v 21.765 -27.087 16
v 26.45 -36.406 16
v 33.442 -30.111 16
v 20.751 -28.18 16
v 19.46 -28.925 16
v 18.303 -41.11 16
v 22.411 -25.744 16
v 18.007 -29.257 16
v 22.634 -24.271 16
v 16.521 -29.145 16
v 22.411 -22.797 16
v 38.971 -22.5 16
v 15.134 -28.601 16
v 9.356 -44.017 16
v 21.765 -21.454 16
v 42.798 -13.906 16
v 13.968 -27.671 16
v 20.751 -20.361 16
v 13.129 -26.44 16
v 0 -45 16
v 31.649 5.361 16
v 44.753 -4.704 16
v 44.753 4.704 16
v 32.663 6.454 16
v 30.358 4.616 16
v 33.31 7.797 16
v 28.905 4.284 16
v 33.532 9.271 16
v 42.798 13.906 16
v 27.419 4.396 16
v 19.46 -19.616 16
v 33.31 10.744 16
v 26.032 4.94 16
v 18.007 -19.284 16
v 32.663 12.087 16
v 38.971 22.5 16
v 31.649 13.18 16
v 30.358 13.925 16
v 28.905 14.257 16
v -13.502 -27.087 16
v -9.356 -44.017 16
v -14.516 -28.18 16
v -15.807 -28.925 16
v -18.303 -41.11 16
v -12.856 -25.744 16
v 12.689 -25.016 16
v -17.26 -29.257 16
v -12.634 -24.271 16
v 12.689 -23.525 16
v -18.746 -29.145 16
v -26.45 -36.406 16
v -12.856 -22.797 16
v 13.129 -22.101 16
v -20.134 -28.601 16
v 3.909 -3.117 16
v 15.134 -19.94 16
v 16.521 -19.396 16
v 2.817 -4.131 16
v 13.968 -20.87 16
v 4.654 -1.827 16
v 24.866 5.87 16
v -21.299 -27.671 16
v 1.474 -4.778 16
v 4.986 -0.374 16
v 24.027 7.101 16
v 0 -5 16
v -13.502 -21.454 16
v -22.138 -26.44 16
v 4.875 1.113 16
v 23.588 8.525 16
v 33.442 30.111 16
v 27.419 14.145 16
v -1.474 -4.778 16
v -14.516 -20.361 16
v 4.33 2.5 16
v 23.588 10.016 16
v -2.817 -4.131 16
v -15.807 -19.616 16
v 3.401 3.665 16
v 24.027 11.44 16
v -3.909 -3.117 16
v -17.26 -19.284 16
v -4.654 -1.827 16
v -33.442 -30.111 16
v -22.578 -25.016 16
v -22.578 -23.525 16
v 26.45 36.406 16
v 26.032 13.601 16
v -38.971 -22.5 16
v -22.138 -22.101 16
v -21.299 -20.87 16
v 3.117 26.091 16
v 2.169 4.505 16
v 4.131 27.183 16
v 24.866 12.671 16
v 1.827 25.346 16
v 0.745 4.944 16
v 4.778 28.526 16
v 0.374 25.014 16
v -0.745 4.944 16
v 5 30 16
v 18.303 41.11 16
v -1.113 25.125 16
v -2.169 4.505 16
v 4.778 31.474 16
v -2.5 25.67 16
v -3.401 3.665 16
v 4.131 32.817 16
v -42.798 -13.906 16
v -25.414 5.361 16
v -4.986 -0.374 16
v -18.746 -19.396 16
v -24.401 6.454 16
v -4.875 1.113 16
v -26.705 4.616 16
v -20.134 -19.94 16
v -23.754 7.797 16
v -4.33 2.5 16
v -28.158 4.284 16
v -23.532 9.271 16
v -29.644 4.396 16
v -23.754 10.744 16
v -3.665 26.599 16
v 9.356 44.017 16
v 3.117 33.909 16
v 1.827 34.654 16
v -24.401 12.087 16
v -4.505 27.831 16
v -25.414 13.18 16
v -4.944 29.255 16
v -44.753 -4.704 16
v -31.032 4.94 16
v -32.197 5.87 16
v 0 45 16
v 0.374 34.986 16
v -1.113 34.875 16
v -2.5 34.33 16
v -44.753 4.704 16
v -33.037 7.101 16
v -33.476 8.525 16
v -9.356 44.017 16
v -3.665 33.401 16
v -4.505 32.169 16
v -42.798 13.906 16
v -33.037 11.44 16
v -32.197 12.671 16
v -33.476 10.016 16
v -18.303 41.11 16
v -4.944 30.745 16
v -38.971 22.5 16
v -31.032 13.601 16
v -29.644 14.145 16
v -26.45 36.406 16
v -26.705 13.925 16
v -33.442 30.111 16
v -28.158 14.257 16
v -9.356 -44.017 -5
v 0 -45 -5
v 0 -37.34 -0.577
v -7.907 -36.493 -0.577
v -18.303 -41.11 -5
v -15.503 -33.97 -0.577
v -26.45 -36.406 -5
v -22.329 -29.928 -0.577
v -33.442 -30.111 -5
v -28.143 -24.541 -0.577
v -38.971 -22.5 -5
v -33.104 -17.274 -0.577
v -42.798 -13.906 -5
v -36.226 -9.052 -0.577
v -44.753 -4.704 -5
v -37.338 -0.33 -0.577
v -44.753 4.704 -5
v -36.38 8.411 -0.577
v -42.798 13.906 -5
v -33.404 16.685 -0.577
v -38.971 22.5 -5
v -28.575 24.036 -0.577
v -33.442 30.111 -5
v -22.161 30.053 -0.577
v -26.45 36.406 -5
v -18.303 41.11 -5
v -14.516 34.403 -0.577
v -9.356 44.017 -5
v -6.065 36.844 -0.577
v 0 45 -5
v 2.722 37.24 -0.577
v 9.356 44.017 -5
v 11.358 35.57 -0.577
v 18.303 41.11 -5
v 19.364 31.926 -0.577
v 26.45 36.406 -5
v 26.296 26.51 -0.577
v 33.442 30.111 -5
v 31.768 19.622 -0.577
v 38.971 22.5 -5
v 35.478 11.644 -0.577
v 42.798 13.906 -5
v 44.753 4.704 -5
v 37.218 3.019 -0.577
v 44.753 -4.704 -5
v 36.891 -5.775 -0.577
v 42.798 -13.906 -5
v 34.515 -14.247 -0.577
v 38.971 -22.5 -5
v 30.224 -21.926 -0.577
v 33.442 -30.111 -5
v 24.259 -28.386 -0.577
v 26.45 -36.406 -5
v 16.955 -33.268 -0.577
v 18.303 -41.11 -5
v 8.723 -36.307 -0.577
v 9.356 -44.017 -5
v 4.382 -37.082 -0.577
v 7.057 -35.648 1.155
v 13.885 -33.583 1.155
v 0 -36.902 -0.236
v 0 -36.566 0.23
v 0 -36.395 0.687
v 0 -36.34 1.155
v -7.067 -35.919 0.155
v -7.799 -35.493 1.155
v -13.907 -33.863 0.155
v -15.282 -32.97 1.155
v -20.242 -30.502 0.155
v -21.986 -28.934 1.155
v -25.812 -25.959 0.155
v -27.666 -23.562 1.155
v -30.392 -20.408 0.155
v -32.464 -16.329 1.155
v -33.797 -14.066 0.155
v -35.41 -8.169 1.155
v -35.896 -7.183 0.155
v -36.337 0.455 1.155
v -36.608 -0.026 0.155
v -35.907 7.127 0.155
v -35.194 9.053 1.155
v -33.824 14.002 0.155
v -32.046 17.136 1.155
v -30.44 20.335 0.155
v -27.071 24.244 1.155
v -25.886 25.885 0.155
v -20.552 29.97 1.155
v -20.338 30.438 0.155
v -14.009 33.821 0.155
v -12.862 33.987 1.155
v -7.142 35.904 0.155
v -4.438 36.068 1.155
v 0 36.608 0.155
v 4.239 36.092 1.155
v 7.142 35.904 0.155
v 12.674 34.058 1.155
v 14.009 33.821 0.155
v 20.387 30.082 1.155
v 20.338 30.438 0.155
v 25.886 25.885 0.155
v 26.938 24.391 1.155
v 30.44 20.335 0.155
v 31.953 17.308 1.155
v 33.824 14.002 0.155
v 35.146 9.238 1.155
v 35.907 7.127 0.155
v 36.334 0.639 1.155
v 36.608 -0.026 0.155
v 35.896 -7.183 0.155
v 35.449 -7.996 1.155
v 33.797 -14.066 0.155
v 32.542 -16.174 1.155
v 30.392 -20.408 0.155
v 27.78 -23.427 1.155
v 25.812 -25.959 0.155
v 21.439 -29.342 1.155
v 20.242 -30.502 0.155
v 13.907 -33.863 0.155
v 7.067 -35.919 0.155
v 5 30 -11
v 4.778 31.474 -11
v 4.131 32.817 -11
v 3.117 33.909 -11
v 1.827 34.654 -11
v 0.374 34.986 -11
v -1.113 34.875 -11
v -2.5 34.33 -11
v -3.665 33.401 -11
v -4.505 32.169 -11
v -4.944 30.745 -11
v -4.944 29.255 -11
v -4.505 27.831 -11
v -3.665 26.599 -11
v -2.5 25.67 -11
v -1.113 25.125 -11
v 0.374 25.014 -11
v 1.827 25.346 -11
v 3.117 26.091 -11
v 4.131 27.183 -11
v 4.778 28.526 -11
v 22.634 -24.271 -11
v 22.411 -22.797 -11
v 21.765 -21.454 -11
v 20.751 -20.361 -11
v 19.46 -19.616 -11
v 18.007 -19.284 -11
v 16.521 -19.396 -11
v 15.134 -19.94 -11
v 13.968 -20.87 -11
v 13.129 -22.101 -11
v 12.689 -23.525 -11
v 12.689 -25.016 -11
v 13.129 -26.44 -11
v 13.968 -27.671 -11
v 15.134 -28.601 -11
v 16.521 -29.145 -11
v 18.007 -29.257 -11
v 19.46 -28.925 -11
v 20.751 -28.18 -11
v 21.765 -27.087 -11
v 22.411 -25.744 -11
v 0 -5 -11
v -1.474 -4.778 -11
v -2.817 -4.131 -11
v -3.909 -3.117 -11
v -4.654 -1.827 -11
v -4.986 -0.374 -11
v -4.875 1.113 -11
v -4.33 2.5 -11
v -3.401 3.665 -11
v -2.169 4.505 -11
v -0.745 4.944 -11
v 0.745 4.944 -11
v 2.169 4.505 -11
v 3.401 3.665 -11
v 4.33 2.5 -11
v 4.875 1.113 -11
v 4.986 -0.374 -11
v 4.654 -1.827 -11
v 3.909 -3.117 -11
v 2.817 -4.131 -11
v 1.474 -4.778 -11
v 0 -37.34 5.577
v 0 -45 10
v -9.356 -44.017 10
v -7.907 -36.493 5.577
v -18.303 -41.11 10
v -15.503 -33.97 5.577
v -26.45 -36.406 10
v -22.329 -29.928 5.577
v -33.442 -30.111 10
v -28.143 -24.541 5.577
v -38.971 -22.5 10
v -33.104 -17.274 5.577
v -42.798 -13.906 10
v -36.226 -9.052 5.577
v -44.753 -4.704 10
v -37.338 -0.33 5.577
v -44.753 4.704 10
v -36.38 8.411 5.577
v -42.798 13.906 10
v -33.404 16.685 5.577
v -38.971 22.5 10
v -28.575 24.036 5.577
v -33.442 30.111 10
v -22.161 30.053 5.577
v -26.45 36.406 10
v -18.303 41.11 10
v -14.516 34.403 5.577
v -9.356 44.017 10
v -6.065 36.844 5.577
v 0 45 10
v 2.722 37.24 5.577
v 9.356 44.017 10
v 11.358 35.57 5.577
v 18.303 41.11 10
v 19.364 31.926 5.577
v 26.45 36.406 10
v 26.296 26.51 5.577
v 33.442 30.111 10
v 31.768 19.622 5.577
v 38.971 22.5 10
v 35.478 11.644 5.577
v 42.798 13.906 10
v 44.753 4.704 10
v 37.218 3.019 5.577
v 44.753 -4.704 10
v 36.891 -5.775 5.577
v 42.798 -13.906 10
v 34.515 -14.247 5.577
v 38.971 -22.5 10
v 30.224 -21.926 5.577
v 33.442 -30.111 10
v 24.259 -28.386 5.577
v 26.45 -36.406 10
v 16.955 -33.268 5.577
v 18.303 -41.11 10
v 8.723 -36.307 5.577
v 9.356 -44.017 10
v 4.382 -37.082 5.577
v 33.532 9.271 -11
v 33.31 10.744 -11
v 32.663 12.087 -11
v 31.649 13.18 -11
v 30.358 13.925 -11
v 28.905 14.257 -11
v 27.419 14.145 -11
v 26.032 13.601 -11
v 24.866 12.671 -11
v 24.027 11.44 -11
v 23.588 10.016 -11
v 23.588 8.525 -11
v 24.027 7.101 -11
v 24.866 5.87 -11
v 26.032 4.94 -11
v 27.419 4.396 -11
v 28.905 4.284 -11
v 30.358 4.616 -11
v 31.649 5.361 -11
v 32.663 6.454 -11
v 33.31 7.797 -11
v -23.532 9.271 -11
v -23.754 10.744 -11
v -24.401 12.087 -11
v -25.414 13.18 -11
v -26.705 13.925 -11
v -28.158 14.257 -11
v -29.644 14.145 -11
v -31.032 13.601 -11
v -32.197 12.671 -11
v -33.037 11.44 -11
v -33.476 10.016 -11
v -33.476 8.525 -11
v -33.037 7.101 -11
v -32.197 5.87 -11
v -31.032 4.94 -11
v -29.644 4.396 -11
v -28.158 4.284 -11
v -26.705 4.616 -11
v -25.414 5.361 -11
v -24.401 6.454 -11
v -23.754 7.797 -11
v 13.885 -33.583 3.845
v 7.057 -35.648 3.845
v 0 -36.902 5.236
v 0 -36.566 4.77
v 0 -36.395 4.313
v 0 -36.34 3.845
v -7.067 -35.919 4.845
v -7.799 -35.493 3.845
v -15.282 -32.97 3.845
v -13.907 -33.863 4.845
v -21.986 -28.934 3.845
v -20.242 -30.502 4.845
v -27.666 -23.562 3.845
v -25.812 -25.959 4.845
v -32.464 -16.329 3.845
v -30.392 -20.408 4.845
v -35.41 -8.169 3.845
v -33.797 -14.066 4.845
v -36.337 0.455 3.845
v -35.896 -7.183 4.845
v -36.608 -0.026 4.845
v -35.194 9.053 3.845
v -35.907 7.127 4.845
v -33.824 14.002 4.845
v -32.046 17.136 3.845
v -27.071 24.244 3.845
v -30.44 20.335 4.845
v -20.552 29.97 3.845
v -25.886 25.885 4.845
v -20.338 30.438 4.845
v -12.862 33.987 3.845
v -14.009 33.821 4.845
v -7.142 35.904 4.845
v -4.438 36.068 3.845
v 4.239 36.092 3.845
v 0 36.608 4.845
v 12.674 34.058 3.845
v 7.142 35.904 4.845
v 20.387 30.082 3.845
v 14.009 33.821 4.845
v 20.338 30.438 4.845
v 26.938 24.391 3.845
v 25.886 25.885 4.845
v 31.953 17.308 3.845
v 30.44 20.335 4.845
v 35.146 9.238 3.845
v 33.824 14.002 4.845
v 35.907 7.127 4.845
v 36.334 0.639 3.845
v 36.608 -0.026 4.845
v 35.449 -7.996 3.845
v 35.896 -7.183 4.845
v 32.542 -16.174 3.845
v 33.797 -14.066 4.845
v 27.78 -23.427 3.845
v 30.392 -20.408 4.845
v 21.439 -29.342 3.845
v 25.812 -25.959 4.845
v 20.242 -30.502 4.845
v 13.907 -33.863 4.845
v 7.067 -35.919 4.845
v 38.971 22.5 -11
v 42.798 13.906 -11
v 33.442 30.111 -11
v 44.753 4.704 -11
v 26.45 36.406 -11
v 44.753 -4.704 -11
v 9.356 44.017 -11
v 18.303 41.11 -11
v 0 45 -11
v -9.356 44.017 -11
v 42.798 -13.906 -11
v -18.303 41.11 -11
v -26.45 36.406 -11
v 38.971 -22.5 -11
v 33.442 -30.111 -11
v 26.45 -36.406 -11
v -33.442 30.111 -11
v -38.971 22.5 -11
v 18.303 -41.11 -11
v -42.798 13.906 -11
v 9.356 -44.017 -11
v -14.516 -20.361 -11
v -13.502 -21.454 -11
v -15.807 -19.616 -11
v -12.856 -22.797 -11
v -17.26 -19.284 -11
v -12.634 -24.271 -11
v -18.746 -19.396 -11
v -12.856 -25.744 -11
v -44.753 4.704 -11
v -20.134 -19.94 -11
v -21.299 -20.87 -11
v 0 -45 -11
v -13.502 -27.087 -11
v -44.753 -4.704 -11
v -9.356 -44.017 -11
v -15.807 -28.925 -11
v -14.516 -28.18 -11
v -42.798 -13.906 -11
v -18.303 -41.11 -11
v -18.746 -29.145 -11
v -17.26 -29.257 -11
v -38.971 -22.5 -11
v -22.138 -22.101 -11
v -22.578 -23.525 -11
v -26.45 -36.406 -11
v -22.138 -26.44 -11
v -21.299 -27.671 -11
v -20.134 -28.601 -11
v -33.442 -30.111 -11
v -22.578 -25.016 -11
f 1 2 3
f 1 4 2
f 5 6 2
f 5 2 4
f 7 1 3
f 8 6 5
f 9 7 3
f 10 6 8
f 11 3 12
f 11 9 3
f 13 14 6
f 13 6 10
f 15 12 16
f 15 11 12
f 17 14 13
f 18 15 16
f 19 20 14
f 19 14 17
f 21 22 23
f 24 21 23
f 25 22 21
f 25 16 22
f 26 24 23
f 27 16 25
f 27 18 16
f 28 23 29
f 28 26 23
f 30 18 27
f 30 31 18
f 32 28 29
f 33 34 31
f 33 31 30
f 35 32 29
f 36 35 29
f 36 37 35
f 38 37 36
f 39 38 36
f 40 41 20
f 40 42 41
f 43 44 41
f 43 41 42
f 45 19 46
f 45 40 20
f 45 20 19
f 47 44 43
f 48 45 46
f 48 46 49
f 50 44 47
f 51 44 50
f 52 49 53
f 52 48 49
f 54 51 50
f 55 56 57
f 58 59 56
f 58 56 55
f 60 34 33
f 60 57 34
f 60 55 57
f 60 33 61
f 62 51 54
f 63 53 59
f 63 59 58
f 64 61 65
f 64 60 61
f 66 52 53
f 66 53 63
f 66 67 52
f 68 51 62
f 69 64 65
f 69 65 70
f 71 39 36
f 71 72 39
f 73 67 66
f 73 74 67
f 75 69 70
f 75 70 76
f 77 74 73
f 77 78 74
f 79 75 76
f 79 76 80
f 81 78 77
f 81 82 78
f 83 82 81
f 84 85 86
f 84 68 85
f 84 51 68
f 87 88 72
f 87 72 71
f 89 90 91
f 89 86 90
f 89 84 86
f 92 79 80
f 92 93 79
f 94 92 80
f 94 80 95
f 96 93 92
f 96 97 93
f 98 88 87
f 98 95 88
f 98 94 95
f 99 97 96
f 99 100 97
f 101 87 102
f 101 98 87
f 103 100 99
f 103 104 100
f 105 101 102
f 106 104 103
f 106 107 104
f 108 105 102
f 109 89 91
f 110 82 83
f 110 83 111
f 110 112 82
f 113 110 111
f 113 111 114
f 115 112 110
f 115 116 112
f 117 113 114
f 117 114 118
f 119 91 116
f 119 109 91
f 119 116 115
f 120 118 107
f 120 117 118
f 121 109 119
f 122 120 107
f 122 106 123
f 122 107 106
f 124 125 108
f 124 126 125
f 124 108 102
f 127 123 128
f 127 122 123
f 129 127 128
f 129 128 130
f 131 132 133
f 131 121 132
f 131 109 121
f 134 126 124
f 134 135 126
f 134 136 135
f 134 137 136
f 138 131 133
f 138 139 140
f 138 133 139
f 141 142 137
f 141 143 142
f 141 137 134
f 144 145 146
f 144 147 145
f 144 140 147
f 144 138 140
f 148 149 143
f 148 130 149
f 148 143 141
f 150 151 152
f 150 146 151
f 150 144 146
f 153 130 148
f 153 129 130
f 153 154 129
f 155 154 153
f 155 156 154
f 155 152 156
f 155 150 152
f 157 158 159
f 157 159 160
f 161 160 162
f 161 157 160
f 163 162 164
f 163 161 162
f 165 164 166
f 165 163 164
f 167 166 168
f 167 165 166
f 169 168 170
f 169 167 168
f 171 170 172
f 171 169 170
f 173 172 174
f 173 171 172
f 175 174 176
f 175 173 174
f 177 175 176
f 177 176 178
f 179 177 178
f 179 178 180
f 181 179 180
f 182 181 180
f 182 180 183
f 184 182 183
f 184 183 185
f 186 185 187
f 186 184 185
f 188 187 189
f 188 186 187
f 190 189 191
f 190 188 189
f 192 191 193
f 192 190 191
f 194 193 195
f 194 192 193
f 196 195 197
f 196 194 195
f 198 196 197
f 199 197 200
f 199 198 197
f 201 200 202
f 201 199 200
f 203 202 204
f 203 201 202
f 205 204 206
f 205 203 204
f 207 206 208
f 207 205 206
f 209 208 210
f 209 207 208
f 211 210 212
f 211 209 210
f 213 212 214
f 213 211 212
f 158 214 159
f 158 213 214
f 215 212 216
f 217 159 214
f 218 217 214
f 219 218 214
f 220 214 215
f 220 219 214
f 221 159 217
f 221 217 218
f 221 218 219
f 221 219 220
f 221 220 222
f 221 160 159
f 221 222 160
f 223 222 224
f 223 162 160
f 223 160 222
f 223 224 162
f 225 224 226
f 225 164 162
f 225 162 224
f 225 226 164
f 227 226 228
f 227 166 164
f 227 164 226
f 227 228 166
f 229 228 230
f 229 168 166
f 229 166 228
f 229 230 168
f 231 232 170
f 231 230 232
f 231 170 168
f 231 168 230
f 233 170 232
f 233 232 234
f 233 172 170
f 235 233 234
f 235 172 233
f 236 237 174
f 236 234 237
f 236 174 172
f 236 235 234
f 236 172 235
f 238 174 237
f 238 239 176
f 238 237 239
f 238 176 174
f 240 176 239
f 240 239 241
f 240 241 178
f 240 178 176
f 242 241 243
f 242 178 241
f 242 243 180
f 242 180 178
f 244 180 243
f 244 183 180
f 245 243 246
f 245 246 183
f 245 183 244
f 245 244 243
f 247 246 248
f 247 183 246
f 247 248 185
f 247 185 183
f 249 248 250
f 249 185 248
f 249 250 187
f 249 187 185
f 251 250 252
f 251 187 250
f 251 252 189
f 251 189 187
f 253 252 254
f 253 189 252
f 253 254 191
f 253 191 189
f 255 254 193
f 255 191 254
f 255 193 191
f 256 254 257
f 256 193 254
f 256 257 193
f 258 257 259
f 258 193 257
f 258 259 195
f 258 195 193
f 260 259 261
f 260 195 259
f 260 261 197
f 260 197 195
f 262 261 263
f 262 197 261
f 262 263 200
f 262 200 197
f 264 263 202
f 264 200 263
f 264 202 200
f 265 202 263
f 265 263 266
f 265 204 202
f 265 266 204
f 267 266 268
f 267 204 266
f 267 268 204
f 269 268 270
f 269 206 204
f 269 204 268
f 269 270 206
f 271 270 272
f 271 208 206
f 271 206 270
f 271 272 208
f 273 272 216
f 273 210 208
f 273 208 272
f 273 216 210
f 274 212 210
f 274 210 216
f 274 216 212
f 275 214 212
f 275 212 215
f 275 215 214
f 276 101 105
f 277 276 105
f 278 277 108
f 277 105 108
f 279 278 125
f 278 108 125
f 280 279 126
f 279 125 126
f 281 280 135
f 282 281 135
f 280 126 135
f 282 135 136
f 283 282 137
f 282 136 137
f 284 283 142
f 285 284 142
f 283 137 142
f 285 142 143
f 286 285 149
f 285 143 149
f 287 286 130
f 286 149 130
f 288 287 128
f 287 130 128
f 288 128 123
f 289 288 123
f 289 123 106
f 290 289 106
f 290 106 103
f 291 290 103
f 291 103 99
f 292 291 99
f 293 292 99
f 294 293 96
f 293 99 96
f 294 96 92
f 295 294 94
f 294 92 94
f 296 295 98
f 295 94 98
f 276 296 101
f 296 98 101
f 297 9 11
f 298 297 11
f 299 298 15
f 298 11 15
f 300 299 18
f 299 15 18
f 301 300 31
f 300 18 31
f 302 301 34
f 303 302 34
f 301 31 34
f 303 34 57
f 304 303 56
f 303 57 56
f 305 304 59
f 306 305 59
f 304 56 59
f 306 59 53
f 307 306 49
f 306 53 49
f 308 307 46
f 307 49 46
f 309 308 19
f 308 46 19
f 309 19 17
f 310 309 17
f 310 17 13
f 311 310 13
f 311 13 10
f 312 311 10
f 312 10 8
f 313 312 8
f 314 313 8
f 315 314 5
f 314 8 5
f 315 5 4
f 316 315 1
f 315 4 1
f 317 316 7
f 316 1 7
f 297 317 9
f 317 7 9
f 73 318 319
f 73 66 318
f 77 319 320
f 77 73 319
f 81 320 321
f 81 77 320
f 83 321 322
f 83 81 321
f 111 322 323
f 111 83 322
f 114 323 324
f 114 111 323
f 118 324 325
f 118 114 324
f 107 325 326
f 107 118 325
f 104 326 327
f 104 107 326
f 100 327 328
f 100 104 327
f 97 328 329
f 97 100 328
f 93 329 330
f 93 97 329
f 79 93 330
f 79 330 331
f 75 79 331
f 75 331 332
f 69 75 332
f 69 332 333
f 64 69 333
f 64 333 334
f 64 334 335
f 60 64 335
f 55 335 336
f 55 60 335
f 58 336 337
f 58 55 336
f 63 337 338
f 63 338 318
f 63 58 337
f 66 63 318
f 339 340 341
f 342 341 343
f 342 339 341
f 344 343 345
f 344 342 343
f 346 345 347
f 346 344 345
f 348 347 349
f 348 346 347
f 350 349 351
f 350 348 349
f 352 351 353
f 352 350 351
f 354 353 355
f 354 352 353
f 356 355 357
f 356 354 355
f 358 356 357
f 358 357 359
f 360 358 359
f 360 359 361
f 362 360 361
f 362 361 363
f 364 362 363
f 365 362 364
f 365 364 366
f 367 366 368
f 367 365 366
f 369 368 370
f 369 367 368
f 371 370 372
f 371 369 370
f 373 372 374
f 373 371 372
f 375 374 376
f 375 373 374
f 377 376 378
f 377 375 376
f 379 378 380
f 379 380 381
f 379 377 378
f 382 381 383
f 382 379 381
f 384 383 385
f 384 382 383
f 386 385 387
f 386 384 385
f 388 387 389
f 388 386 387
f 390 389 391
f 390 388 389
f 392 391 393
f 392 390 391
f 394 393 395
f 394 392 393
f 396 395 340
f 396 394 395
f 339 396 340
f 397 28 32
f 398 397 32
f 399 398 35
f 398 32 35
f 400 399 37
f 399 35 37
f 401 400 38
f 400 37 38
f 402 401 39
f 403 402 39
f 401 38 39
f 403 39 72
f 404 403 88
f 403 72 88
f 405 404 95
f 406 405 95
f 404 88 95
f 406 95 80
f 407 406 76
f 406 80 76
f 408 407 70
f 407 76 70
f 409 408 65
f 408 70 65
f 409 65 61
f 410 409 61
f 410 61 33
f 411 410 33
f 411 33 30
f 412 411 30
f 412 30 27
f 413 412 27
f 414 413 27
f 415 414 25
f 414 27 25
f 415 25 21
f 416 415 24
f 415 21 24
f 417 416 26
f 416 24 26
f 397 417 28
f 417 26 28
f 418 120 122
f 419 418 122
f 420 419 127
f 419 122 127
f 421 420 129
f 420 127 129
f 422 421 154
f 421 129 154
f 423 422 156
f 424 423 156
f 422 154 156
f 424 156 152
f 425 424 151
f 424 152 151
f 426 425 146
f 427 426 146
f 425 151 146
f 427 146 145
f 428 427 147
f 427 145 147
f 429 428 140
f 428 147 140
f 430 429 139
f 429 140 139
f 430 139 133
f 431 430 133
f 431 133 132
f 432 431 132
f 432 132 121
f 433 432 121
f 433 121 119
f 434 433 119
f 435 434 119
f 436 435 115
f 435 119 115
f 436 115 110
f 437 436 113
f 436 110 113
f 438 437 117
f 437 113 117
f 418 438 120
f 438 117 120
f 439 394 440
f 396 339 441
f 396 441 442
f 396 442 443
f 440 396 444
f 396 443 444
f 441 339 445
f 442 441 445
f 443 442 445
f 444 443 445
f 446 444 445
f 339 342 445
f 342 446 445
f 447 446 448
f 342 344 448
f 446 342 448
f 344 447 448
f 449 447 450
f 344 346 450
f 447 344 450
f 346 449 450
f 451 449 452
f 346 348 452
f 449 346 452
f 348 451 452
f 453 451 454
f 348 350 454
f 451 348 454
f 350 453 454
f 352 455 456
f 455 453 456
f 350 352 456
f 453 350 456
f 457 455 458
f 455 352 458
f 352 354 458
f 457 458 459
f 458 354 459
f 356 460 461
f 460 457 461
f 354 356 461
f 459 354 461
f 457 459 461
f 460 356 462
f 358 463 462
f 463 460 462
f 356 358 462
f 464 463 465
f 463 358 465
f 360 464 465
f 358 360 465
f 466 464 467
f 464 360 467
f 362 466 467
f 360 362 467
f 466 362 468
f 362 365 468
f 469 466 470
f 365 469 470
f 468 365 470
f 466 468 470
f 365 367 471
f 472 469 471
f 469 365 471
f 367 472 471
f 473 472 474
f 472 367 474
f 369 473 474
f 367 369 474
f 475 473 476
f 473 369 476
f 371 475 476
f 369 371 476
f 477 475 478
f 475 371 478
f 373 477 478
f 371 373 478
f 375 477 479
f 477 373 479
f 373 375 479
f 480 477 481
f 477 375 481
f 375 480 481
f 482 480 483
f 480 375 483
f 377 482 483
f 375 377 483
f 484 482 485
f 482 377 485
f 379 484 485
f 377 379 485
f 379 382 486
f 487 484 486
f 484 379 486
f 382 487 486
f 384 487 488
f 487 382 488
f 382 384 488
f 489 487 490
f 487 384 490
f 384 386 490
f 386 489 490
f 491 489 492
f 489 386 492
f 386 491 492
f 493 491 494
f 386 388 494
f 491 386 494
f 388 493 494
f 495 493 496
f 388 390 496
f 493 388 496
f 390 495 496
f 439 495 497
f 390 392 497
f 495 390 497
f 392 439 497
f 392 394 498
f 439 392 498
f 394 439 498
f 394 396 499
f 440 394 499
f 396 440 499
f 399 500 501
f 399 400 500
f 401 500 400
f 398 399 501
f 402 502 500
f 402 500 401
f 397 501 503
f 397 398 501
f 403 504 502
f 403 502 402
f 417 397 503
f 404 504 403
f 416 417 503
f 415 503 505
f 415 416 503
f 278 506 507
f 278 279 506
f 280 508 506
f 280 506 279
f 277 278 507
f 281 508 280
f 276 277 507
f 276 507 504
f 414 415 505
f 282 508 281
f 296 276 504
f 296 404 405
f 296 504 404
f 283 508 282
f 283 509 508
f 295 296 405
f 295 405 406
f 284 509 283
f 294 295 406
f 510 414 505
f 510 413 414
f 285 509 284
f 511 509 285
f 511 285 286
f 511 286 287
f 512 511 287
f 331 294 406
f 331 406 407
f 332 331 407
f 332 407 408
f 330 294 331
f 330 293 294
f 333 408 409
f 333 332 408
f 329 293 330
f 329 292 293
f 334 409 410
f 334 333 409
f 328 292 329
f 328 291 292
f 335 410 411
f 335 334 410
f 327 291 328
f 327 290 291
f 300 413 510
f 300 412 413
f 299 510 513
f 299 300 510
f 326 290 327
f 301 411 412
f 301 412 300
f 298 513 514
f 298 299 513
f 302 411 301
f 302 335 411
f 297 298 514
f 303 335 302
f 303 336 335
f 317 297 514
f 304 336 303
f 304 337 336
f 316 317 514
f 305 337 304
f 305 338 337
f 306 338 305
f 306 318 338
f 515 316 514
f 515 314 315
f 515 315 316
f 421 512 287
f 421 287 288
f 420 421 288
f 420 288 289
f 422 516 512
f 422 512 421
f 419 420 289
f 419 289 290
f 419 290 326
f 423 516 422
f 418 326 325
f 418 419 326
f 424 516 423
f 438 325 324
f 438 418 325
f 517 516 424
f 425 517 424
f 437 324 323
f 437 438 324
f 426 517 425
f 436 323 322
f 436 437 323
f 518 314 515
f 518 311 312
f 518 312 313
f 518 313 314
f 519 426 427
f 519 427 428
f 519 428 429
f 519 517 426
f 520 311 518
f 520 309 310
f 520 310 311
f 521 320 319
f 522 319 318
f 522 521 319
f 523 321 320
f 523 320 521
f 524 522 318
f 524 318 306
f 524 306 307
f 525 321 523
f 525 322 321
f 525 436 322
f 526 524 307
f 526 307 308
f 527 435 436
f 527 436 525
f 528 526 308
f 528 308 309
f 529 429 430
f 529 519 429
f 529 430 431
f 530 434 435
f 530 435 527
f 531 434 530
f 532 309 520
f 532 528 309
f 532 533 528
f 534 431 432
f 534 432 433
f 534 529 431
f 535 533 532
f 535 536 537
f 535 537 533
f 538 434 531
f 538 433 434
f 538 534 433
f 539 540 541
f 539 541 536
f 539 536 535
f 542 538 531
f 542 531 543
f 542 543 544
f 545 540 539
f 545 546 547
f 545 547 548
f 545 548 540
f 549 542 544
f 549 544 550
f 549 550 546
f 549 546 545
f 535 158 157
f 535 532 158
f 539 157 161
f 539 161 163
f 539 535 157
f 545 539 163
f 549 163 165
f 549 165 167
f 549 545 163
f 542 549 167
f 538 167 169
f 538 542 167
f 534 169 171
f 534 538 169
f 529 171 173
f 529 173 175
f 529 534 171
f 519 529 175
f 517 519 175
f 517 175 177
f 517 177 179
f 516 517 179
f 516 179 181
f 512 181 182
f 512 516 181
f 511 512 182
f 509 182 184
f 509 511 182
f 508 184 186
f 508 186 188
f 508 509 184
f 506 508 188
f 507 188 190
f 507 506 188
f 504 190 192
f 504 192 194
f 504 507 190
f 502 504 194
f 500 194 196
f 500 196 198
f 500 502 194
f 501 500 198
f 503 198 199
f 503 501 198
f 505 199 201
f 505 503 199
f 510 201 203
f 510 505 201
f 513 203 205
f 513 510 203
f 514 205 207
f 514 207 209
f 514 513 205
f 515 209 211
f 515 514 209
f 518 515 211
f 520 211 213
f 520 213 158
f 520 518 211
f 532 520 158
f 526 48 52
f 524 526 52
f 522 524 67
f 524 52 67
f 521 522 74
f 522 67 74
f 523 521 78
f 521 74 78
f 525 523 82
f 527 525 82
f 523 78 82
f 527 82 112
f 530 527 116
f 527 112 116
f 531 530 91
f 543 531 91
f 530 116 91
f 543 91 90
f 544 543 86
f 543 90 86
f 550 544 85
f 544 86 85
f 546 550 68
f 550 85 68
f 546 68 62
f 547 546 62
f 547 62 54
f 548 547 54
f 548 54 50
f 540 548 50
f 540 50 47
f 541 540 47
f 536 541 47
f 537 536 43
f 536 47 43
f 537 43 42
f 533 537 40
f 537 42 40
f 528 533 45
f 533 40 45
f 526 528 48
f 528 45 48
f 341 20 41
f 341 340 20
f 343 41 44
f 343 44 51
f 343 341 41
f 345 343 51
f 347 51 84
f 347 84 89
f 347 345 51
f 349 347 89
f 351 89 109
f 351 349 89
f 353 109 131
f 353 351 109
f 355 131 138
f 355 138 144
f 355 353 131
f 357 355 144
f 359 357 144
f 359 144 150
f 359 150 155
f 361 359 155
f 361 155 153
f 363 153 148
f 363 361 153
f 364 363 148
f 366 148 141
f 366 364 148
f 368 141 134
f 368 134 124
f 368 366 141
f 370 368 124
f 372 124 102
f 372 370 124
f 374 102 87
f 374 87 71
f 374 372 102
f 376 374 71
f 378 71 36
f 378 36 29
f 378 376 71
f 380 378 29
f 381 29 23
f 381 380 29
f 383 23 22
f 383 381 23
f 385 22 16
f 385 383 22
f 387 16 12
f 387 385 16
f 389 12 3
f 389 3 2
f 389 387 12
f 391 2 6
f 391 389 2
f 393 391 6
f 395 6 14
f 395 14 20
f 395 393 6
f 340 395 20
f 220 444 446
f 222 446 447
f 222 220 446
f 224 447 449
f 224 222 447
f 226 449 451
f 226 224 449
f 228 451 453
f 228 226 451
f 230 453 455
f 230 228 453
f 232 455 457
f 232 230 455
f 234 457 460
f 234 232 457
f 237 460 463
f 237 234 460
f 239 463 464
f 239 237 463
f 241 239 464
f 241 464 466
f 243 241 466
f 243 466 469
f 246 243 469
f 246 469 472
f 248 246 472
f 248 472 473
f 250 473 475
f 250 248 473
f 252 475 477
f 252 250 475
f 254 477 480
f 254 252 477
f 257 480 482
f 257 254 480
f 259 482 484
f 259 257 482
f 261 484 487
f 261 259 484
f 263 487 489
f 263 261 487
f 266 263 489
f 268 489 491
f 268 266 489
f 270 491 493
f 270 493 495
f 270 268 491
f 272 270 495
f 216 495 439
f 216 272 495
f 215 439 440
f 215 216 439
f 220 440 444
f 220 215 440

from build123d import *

# Parameters (mm, degrees)
F2_R     = 5
F3_DEPTH = 27
F4_R     = 2


# Not quite as in the source:
# - a feature names something its author has since deleted; it is built from what else it names


with BuildPart() as f1:
    # F0 (on Right) → F1 (revolve)
    with BuildSketch(Plane.YZ):
        Polygon((-5, -11), (-5, 16), (-45, 16), (-45, 10), (-36.3397459622, 5), (-36.3397459622, 0), (-45, -5), (-45, -11), align=None)
    revolve(axis=Axis((0, 0, -0.4931497392), (0, 0, -1)))

    # F2 (on face) → F3 (cut, through all)
    with BuildSketch(Plane.XY.offset(16)):
        with Locations((-28.5316954889, 9.2705098312)):
            Circle(F2_R)
        with Locations((-17.6335575688, -24.2705098312)):
            Circle(F2_R)
        with Locations((17.6335575688, -24.2705098312)):
            Circle(F2_R)
        with Locations((28.5316954889, 9.2705098312)):
            Circle(F2_R)
        with Locations((0, 30)):
            Circle(F2_R)
    extrude(amount=-F3_DEPTH, mode=Mode.SUBTRACT)

    # F4
    f4_edges = [f1.edges().sort_by_distance(p)[0] for p in [
        (0, 36.339746, 0),
        (0, 36.339746, 5),
    ]]
    fillet(f4_edges, radius=F4_R)


solid = f1.part
